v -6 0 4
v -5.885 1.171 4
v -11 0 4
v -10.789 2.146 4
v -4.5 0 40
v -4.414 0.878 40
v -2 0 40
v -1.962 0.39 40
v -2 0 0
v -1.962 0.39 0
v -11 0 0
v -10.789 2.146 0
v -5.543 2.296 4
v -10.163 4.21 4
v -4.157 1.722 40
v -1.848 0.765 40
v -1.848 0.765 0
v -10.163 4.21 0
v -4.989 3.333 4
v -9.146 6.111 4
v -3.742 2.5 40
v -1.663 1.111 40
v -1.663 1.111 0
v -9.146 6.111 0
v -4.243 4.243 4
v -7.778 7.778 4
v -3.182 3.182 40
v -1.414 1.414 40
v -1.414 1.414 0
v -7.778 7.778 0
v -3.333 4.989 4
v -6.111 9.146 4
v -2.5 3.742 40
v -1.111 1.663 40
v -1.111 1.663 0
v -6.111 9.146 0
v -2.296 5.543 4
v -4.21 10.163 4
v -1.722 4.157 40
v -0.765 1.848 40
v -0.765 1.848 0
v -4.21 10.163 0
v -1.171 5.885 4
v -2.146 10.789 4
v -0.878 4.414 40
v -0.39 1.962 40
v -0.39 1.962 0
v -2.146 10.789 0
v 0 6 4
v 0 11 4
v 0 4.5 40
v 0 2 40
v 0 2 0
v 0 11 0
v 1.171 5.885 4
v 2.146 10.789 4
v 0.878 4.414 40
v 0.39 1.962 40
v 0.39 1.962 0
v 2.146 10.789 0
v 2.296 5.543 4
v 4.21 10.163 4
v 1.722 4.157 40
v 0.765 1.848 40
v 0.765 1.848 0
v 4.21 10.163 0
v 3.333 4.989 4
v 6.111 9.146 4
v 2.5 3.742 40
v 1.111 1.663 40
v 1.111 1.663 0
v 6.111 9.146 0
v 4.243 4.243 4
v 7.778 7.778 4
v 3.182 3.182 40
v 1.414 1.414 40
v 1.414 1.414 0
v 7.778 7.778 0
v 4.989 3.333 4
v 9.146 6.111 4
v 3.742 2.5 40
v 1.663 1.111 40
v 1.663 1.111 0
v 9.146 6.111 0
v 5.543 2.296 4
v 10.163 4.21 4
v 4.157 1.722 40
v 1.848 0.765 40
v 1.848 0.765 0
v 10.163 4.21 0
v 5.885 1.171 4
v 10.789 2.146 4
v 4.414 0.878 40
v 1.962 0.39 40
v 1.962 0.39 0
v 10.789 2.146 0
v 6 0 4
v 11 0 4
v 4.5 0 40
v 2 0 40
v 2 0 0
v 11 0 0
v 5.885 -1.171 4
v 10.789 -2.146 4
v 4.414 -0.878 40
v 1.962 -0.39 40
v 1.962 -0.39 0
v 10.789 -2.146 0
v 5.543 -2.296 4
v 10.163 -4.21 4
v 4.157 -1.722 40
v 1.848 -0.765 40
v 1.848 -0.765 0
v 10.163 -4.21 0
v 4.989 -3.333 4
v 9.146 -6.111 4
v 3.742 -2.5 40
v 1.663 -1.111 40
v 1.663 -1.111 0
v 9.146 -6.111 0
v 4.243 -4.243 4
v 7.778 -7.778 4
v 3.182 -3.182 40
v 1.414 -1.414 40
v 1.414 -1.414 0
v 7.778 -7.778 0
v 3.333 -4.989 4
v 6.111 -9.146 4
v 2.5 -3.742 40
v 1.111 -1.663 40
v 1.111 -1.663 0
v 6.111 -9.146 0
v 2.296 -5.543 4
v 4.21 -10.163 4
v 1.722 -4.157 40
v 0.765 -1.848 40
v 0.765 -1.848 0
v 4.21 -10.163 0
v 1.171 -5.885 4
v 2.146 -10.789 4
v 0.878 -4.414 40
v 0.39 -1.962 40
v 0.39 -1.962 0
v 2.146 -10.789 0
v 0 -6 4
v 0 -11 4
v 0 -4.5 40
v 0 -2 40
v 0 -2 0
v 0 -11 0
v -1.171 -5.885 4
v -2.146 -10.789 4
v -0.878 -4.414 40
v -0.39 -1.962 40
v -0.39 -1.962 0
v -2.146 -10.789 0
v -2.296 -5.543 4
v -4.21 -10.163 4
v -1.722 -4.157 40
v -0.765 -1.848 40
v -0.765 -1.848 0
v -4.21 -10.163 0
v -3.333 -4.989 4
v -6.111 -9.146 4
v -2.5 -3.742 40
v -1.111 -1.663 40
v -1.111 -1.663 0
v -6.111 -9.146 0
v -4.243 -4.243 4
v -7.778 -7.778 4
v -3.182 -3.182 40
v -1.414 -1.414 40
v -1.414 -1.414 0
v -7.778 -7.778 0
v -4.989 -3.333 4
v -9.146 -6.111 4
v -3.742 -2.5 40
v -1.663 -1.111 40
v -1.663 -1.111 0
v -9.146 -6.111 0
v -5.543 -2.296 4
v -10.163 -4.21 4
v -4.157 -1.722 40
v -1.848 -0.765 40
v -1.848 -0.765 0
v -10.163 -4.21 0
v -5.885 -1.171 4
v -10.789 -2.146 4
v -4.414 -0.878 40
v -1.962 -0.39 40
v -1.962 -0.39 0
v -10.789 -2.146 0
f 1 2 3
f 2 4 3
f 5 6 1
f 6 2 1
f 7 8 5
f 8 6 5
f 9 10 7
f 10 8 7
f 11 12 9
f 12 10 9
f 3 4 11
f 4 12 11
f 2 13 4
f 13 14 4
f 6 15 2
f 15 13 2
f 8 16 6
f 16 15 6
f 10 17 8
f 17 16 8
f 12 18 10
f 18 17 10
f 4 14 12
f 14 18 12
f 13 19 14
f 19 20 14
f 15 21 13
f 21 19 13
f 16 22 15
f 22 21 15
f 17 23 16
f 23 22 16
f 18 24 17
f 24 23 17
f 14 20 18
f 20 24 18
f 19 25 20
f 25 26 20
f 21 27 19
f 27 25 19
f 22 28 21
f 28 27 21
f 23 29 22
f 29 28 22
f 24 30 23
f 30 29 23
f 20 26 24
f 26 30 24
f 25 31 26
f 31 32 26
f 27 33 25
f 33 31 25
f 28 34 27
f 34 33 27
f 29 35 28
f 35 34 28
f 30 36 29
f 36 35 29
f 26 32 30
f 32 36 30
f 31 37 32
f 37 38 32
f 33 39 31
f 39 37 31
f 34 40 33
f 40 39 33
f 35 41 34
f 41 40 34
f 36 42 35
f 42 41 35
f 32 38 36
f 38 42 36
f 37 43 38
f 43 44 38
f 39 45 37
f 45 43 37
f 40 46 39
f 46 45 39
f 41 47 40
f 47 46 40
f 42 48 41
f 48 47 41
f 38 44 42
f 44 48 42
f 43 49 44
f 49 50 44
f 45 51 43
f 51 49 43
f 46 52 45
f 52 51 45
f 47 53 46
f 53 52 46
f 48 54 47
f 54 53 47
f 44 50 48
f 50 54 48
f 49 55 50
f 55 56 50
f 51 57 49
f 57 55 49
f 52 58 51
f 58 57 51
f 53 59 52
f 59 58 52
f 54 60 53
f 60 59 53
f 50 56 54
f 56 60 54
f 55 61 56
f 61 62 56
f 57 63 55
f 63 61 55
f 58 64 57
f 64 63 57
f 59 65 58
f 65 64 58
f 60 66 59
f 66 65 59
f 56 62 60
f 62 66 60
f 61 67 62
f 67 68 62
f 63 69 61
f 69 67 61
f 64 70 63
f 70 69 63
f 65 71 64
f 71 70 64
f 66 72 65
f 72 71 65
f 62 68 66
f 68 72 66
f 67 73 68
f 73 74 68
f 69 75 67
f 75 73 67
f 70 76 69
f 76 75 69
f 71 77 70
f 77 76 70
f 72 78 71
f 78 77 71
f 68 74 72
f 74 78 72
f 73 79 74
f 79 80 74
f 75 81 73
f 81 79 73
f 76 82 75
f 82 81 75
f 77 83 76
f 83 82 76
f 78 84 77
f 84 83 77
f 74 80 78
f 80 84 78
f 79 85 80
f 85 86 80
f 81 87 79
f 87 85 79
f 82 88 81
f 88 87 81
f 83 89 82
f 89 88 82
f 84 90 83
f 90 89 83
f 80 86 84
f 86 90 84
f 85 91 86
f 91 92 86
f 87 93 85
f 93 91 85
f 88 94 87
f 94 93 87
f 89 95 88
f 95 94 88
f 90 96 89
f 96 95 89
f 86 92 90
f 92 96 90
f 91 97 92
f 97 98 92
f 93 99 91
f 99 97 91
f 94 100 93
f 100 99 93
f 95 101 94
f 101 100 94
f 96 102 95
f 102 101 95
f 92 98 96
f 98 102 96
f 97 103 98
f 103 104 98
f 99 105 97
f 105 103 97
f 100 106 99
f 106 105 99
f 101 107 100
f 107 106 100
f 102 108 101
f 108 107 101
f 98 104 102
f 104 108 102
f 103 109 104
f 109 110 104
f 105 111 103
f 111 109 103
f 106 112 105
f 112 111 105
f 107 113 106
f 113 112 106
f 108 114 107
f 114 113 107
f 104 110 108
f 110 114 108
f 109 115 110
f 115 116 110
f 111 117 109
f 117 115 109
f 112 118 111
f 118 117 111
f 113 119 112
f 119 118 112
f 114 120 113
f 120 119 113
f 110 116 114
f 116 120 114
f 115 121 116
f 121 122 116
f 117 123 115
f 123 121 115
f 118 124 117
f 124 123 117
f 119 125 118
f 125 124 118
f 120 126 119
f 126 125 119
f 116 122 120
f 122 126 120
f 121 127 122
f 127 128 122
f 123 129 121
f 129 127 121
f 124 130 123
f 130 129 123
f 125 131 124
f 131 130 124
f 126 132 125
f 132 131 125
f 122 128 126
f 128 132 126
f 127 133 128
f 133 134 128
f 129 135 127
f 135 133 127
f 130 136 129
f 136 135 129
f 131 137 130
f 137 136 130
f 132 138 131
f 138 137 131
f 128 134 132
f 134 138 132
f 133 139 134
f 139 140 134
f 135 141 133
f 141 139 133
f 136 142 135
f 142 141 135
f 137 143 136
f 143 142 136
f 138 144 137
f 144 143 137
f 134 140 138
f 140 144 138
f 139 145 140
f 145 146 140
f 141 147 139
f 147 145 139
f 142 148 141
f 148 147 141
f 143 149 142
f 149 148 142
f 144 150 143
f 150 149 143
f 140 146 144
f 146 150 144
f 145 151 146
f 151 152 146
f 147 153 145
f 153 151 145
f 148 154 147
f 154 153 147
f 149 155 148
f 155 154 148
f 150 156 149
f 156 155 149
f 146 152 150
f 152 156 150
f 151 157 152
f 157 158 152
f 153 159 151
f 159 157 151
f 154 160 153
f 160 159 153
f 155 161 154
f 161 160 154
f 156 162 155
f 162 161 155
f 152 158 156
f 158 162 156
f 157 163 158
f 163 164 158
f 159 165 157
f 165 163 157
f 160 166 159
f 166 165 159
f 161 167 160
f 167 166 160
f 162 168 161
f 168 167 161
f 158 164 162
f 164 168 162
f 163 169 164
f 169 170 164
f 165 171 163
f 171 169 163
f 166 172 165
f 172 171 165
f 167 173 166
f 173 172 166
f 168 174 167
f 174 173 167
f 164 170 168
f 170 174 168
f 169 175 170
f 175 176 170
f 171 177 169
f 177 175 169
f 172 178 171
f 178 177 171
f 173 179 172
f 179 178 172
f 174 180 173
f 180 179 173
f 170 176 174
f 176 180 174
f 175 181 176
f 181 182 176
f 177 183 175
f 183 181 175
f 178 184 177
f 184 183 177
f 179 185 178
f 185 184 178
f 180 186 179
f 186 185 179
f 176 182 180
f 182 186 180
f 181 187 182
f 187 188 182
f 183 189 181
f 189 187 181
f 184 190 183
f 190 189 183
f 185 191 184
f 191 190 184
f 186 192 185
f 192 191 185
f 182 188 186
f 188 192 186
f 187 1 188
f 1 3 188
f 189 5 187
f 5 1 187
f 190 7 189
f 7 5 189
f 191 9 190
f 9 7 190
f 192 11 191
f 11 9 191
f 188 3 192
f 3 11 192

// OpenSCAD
$fn = 32;

// ----------------------------------------------------------------------
// Profiled standoff: conical spacer, 40 mm long, bore 4 mm
// ----------------------------------------------------------------------

// --- parameters (mm) ---
revolve_angle = 360;      // full turn around the Z axis
profile_points = 6;       // points of the closed outline

profile = [[2, 0], [11, 0], [11, 4], [6, 4], [4.5, 40], [2, 40]];  // single closed polygon, 6 points, counter clockwise

// --- the one profile operation ---
rotate_extrude(angle = revolve_angle) polygon(points = profile);
